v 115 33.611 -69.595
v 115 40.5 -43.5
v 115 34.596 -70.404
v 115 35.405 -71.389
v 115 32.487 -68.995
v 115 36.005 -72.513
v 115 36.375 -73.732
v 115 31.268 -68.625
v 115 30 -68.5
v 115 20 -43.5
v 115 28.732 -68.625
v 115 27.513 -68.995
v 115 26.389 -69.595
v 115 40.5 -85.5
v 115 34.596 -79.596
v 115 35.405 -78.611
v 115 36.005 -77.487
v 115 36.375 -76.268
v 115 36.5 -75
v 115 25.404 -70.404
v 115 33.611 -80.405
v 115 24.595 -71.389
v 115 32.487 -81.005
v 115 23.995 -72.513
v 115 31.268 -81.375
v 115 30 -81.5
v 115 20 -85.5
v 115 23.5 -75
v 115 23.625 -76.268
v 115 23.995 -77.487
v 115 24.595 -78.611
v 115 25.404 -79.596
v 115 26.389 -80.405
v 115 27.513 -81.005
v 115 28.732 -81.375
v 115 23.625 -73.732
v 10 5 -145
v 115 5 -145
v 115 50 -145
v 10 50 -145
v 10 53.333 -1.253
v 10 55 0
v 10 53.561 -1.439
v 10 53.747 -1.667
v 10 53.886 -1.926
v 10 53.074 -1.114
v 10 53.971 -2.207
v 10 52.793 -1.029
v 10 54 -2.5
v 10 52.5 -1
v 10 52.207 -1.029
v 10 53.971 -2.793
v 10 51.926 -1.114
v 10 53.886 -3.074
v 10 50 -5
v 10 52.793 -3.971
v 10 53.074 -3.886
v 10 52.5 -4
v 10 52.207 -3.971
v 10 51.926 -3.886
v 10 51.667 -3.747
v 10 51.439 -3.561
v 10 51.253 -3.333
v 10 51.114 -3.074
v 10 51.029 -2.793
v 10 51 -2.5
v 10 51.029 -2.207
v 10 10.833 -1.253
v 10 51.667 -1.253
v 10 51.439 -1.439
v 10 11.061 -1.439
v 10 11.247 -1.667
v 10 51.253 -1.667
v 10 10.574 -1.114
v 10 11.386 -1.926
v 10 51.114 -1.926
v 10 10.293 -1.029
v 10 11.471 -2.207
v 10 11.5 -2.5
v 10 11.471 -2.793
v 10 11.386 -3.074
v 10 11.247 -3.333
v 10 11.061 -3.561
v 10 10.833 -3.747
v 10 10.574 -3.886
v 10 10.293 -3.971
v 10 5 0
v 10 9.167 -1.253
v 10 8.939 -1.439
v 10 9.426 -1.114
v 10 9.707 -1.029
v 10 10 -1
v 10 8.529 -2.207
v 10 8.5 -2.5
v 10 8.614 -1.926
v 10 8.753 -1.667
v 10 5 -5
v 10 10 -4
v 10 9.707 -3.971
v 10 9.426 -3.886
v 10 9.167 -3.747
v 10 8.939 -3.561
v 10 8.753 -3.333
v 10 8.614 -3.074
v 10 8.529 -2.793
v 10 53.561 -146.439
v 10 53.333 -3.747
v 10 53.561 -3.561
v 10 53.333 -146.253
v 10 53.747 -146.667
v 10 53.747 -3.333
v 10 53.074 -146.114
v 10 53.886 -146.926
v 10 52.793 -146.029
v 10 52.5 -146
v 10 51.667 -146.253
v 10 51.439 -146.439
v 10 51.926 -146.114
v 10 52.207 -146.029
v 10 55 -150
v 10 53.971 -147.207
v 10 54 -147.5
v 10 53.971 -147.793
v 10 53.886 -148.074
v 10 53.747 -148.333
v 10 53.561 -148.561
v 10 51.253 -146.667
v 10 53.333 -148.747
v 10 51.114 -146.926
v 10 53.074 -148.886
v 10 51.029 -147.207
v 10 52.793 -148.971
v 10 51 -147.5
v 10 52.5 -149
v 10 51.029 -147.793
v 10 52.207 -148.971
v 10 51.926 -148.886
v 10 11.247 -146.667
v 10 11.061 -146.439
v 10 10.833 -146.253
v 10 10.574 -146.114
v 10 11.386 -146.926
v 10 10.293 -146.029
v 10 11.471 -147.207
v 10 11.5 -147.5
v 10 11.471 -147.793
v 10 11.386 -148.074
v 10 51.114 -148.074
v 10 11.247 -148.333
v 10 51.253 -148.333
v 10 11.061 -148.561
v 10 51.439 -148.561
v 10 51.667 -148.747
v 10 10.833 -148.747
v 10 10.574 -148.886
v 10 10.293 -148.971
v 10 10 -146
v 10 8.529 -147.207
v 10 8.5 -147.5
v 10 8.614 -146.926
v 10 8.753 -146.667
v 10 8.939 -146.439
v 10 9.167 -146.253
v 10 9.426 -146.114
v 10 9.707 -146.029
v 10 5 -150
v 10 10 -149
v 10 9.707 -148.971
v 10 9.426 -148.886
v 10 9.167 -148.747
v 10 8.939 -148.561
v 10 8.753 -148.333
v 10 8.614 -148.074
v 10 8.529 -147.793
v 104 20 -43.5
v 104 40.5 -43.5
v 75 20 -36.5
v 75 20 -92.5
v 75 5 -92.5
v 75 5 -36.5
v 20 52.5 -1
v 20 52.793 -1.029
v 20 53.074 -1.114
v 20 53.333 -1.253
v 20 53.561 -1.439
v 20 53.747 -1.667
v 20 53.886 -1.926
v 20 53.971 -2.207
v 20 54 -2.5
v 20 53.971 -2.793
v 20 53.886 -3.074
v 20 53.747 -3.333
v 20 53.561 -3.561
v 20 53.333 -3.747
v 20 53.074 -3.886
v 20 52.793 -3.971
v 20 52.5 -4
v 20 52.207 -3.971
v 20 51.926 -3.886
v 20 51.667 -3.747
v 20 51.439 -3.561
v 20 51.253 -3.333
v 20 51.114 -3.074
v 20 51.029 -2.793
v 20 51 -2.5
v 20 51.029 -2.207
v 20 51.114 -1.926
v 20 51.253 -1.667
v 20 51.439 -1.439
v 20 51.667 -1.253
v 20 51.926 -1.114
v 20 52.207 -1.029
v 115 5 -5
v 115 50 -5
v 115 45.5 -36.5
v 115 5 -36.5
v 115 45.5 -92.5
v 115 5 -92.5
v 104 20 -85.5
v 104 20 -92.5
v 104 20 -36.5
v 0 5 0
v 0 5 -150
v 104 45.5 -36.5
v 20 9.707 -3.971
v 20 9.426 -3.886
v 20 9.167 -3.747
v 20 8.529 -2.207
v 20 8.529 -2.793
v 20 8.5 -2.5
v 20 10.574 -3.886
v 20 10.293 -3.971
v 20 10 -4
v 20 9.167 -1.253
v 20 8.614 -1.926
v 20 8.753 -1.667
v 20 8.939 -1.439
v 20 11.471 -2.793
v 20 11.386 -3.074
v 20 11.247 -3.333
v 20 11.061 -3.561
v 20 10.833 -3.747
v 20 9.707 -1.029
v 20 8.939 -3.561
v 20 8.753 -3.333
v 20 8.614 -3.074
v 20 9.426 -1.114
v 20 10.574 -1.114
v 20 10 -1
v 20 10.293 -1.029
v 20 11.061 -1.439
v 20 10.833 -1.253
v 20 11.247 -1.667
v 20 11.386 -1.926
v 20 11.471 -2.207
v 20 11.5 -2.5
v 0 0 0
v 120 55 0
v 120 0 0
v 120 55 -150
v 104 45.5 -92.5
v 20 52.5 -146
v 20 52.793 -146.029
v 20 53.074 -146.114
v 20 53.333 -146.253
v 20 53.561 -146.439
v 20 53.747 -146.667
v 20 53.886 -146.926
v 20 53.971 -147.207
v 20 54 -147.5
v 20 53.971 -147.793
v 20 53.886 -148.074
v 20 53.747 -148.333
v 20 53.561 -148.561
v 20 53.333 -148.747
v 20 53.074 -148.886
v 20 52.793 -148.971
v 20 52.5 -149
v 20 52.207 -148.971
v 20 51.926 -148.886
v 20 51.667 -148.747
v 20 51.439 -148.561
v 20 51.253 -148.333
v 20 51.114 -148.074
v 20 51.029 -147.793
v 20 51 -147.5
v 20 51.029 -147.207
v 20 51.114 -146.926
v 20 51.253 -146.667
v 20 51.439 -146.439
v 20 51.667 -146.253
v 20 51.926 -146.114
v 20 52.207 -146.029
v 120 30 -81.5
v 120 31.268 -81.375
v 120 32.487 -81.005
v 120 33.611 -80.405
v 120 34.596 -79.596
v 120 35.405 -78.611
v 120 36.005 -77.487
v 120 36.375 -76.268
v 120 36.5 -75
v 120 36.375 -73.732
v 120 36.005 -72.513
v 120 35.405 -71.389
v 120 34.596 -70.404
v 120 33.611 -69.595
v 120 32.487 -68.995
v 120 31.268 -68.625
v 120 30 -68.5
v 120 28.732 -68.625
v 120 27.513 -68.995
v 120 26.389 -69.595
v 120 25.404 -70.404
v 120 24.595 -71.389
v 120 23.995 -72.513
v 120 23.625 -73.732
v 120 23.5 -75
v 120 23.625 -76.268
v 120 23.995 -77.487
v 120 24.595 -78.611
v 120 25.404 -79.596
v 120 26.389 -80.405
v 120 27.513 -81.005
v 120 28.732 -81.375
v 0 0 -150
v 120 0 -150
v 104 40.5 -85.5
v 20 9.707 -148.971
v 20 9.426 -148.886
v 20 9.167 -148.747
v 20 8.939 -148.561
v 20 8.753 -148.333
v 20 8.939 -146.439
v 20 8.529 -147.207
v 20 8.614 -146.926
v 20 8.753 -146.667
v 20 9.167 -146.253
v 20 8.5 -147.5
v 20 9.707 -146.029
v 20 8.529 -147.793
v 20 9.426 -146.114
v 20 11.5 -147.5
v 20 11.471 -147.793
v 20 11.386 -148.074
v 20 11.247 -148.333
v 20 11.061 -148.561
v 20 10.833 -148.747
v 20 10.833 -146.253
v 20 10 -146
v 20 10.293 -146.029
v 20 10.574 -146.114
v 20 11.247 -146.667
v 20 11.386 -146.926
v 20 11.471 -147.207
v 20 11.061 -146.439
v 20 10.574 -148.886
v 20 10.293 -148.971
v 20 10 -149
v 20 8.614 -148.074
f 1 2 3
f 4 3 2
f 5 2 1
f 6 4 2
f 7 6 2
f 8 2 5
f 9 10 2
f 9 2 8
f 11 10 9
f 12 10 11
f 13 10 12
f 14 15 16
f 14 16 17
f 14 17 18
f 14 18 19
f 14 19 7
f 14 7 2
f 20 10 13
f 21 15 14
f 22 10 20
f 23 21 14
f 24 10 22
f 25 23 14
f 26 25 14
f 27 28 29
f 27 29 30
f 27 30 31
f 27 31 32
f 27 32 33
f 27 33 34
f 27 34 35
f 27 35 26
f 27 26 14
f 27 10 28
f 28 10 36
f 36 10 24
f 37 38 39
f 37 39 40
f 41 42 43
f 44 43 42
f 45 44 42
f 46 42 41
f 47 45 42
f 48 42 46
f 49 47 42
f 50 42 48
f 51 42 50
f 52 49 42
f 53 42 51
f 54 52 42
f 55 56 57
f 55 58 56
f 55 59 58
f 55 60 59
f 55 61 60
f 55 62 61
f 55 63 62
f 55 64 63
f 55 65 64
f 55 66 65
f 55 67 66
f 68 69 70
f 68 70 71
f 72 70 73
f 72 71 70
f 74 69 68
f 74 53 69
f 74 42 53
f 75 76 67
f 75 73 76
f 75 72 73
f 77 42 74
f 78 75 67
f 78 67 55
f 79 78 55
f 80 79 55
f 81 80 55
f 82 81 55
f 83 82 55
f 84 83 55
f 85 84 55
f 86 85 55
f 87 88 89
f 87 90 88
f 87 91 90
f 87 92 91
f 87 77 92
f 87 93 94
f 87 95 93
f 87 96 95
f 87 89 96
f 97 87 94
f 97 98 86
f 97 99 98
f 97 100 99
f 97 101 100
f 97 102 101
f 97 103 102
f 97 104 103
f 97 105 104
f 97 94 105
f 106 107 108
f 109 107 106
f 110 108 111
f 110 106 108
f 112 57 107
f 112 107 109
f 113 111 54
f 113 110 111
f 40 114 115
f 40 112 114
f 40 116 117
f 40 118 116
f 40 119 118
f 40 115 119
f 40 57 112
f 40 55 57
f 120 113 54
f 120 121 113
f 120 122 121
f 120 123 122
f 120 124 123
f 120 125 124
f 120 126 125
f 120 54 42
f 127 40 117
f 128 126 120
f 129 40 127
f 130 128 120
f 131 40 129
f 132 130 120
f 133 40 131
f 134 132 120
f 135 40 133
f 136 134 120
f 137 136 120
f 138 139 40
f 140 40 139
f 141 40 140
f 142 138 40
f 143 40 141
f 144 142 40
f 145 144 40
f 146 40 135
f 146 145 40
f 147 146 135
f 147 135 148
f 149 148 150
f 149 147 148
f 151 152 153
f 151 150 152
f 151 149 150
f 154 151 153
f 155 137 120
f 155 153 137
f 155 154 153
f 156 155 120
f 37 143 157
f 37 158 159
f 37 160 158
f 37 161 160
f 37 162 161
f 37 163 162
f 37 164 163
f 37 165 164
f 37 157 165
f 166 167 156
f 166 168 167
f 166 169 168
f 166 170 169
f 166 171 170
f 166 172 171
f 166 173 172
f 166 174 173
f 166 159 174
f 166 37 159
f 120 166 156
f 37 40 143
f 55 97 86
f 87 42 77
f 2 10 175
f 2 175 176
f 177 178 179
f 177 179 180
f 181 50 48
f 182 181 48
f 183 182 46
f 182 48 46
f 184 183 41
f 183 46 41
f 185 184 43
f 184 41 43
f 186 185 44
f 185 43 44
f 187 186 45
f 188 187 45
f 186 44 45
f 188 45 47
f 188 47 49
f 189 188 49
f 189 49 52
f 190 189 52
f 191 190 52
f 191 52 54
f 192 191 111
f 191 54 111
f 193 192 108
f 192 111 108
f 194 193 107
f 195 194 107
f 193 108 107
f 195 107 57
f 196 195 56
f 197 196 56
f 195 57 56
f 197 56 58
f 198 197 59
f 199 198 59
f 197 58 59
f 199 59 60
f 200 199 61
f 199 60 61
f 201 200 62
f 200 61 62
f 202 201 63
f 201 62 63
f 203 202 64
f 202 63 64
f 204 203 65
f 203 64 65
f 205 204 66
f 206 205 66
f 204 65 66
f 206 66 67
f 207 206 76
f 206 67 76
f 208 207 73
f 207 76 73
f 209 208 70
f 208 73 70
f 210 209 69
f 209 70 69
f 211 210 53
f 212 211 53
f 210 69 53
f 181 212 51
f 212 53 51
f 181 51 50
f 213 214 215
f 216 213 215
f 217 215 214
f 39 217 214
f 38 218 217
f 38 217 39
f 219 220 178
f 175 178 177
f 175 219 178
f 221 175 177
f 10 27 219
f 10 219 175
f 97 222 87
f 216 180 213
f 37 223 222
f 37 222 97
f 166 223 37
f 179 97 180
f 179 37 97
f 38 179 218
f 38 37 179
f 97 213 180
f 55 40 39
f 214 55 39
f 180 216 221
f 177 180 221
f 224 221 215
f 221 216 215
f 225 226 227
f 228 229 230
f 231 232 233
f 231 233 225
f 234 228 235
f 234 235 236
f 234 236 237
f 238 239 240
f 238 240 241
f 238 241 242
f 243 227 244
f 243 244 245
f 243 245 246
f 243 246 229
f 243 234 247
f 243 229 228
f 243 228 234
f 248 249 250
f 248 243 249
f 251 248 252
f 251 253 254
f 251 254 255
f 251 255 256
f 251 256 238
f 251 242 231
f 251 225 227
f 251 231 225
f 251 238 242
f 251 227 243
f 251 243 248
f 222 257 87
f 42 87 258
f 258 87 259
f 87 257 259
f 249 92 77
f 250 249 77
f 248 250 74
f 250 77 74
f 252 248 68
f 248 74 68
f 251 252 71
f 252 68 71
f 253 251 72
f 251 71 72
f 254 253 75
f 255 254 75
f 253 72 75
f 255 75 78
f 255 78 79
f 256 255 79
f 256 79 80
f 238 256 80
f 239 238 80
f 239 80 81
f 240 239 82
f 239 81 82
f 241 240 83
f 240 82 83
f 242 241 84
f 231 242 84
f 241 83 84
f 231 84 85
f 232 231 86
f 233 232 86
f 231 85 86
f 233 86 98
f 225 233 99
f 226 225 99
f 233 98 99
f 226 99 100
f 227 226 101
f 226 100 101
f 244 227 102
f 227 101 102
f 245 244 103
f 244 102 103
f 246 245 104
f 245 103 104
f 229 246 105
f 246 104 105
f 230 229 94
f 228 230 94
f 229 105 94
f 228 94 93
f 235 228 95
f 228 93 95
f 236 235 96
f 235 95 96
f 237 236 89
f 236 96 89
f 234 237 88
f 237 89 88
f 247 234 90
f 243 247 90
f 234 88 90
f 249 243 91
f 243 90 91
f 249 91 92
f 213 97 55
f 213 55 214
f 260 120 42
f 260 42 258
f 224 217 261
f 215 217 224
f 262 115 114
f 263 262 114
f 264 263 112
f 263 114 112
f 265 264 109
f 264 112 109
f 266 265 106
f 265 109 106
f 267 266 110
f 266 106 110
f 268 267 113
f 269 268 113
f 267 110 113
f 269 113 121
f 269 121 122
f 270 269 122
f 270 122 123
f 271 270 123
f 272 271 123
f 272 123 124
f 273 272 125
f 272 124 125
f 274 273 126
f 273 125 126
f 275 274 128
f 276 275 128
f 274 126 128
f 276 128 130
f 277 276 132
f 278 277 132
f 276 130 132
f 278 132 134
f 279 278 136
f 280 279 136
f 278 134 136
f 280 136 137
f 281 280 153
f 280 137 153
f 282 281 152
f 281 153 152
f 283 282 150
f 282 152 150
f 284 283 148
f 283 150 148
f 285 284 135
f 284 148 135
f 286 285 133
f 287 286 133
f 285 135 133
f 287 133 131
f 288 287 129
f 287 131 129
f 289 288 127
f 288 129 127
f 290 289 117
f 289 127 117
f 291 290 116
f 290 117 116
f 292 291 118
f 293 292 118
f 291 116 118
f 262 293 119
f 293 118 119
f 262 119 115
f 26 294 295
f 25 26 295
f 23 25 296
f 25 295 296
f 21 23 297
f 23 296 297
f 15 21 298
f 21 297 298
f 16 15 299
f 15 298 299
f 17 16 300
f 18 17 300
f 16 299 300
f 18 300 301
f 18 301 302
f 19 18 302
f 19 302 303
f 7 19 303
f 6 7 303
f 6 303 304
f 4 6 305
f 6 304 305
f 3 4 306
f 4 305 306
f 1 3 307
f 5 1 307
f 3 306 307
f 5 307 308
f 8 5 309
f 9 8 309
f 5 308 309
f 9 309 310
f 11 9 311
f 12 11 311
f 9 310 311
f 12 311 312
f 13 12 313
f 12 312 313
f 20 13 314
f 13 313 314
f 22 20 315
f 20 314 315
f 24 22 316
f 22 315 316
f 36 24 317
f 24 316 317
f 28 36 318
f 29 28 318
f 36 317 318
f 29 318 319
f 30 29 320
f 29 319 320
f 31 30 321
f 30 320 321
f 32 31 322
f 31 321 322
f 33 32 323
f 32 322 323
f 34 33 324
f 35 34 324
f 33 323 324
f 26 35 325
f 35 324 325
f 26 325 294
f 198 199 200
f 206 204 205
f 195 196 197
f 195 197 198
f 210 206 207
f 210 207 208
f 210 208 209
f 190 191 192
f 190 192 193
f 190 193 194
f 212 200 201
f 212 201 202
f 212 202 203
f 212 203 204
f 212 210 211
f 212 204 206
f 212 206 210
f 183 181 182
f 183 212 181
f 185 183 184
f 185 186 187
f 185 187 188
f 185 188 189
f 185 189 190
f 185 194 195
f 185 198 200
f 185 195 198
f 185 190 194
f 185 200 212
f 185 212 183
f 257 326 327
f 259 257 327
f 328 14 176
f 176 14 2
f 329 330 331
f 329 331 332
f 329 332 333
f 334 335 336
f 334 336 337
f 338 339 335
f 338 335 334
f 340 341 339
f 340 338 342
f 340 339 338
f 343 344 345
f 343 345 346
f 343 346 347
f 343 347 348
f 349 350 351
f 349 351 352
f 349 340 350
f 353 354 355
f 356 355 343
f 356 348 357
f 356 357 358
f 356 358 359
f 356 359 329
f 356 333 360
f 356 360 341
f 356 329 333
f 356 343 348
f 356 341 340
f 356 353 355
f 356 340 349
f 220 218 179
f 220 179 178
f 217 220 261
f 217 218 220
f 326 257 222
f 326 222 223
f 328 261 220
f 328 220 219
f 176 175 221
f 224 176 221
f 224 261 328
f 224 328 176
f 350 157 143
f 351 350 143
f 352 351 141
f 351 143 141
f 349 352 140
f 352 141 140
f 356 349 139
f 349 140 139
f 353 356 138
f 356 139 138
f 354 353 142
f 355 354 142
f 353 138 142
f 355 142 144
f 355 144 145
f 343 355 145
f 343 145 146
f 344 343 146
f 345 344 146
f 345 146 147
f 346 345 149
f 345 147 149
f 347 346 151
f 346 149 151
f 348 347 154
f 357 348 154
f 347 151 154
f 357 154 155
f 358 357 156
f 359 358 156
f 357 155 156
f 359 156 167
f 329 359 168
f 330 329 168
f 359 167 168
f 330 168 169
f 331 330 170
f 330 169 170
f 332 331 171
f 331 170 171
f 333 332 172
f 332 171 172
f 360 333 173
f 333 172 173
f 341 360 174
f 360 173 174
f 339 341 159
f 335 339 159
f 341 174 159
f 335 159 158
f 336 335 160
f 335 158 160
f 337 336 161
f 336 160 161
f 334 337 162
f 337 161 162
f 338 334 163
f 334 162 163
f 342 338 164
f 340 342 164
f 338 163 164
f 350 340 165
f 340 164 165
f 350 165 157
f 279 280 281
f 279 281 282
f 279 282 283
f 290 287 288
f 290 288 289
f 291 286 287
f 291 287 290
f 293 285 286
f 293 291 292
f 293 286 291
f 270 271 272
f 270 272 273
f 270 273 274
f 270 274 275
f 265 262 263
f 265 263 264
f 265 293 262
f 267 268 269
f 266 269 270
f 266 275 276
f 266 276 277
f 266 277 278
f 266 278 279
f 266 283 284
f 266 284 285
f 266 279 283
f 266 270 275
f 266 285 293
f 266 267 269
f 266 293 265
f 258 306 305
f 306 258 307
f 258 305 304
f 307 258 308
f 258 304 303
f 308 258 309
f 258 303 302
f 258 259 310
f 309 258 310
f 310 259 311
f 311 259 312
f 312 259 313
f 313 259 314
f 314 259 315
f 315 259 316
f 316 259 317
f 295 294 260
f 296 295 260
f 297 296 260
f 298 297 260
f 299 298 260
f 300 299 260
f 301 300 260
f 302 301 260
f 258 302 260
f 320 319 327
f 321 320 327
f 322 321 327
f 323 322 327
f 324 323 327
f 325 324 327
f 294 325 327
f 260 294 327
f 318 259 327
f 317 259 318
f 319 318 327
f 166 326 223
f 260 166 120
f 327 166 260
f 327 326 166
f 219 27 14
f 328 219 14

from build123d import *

# Parameters (mm, degrees)
SKETCH3_W           = 120
SKETCH3_H           = 150
BOSS_EXTRUDE2_DEPTH = 5
BOSS_EXTRUDE3_DEPTH = 45
SKETCH5_W           = 110
SKETCH5_H           = 150
BOSS_EXTRUDE4_DEPTH = 5
SKETCH6_R           = 6.5
CUT_EXTRUDE1_DEPTH  = 5
SKETCH7_W           = 40
SKETCH7_H           = 140
BOSS_EXTRUDE5_DEPTH = 8
SKETCH8_W           = 40
SKETCH8_H           = 5
BOSS_EXTRUDE6_DEPTH = 25.5
SKETCH9_R           = 1.5
CUT_EXTRUDE2_DEPTH  = 10
SKETCH10_W          = 47.5
SKETCH10_H          = 8
CUT_EXTRUDE3_DEPTH  = 40
SKETCH11_W          = 45
SKETCH11_H          = 33.5
CUT_EXTRUDE4_DEPTH  = 40
SKETCH12_W          = 56
SKETCH12_H          = 15
BOSS_EXTRUDE7_DEPTH = 40
SKETCH13_W          = 7
SKETCH13_H          = 20.5
BOSS_EXTRUDE8_DEPTH = 11
SKETCH14_W          = 56
SKETCH14_H          = 5
BOSS_EXTRUDE9_DEPTH = 11


with BuildPart() as part:
    # Sketch3 → Boss-Extrude2 (new body)
    with BuildSketch(Plane(origin=(0, 0, 0), x_dir=(1, 0, 0), z_dir=(0, 1, 0))):
        with Locations((60, 75)):
            Rectangle(SKETCH3_W, SKETCH3_H)
    extrude(amount=BOSS_EXTRUDE2_DEPTH)

    # Sketch4 → Boss-Extrude3 (add)
    with BuildSketch(Plane(origin=(0, 5, 0), x_dir=(1, 0, 0), z_dir=(0, 1, 0))):
        Polygon((10, 0), (10, 5), (115, 5), (115, 145), (10, 145), (10, 150), (120, 150), (120, 0), align=None)
    extrude(amount=BOSS_EXTRUDE3_DEPTH)

    # Sketch5 → Boss-Extrude4 (add)
    with BuildSketch(Plane(origin=(0, 50, 0), x_dir=(1, 0, 0), z_dir=(0, 1, 0))):
        with Locations((65, 75)):
            Rectangle(SKETCH5_W, SKETCH5_H)
    extrude(amount=BOSS_EXTRUDE4_DEPTH)

    # Sketch6 → Cut-Extrude1 (cut)
    with BuildSketch(Plane(origin=(120, 0, 0), x_dir=(0, 0, -1), z_dir=(1, 0, 0))):
        with Locations((75, 30)):
            Circle(SKETCH6_R)
    extrude(amount=-CUT_EXTRUDE1_DEPTH, mode=Mode.SUBTRACT)

    # Sketch7 → Boss-Extrude5 (add)
    with BuildSketch(Plane(origin=(0, 5, 0), x_dir=(1, 0, 0), z_dir=(0, 1, 0))):
        with Locations((95, 75)):
            Rectangle(SKETCH7_W, SKETCH7_H)
    extrude(amount=BOSS_EXTRUDE5_DEPTH)

    # Sketch8 → Boss-Extrude6 (add)
    with BuildSketch(Plane(origin=(0, 13, 0), x_dir=(1, 0, 0), z_dir=(0, 1, 0))):
        with Locations((95, 55)):
            Rectangle(SKETCH8_W, SKETCH8_H)
        with Locations((95, 95)):
            Rectangle(SKETCH8_W, SKETCH8_H)
    extrude(amount=BOSS_EXTRUDE6_DEPTH)

    # Sketch9 → Cut-Extrude2 (cut)
    with BuildSketch(Plane.ZY.offset(-10)):
        with Locations((-147.5, 10)):
            Circle(SKETCH9_R)
        with Locations((-147.5, 52.5)):
            Circle(SKETCH9_R)
        with Locations((-2.5, 10)):
            Circle(SKETCH9_R)
        with Locations((-2.5, 52.5)):
            Circle(SKETCH9_R)
    extrude(amount=-CUT_EXTRUDE2_DEPTH, mode=Mode.SUBTRACT)

    # Sketch10 → Cut-Extrude3 (cut)
    with BuildSketch(Plane.ZY.offset(-75)):
        with Locations((-121.25, 9)):
            Rectangle(SKETCH10_W, SKETCH10_H)
        with Locations((-28.75, 9)):
            Rectangle(SKETCH10_W, SKETCH10_H)
    extrude(amount=-CUT_EXTRUDE3_DEPTH, mode=Mode.SUBTRACT)

    # Sketch11 → Cut-Extrude4 (cut)
    with BuildSketch(Plane.ZY.offset(-75)):
        with Locations((-75, 21.75)):
            Rectangle(SKETCH11_W, SKETCH11_H)
    extrude(amount=-CUT_EXTRUDE4_DEPTH, mode=Mode.SUBTRACT)

    # Sketch12 → Boss-Extrude7 (add)
    with BuildSketch(Plane.ZY.offset(-115)):
        with Locations((-64.5, 12.5)):
            Rectangle(SKETCH12_W, SKETCH12_H)
    extrude(amount=BOSS_EXTRUDE7_DEPTH)

    # Sketch13 → Boss-Extrude8 (add)
    with BuildSketch(Plane.ZY.offset(-115)):
        with Locations((-89, 30.25)):
            Rectangle(SKETCH13_W, SKETCH13_H)
        with Locations((-40, 30.25)):
            Rectangle(SKETCH13_W, SKETCH13_H)
    extrude(amount=BOSS_EXTRUDE8_DEPTH)

    # Sketch14 → Boss-Extrude9 (add)
    with BuildSketch(Plane.ZY.offset(-115)):
        with Locations((-64.5, 43)):
            Rectangle(SKETCH14_W, SKETCH14_H)
    extrude(amount=BOSS_EXTRUDE9_DEPTH)


solid = part.part
